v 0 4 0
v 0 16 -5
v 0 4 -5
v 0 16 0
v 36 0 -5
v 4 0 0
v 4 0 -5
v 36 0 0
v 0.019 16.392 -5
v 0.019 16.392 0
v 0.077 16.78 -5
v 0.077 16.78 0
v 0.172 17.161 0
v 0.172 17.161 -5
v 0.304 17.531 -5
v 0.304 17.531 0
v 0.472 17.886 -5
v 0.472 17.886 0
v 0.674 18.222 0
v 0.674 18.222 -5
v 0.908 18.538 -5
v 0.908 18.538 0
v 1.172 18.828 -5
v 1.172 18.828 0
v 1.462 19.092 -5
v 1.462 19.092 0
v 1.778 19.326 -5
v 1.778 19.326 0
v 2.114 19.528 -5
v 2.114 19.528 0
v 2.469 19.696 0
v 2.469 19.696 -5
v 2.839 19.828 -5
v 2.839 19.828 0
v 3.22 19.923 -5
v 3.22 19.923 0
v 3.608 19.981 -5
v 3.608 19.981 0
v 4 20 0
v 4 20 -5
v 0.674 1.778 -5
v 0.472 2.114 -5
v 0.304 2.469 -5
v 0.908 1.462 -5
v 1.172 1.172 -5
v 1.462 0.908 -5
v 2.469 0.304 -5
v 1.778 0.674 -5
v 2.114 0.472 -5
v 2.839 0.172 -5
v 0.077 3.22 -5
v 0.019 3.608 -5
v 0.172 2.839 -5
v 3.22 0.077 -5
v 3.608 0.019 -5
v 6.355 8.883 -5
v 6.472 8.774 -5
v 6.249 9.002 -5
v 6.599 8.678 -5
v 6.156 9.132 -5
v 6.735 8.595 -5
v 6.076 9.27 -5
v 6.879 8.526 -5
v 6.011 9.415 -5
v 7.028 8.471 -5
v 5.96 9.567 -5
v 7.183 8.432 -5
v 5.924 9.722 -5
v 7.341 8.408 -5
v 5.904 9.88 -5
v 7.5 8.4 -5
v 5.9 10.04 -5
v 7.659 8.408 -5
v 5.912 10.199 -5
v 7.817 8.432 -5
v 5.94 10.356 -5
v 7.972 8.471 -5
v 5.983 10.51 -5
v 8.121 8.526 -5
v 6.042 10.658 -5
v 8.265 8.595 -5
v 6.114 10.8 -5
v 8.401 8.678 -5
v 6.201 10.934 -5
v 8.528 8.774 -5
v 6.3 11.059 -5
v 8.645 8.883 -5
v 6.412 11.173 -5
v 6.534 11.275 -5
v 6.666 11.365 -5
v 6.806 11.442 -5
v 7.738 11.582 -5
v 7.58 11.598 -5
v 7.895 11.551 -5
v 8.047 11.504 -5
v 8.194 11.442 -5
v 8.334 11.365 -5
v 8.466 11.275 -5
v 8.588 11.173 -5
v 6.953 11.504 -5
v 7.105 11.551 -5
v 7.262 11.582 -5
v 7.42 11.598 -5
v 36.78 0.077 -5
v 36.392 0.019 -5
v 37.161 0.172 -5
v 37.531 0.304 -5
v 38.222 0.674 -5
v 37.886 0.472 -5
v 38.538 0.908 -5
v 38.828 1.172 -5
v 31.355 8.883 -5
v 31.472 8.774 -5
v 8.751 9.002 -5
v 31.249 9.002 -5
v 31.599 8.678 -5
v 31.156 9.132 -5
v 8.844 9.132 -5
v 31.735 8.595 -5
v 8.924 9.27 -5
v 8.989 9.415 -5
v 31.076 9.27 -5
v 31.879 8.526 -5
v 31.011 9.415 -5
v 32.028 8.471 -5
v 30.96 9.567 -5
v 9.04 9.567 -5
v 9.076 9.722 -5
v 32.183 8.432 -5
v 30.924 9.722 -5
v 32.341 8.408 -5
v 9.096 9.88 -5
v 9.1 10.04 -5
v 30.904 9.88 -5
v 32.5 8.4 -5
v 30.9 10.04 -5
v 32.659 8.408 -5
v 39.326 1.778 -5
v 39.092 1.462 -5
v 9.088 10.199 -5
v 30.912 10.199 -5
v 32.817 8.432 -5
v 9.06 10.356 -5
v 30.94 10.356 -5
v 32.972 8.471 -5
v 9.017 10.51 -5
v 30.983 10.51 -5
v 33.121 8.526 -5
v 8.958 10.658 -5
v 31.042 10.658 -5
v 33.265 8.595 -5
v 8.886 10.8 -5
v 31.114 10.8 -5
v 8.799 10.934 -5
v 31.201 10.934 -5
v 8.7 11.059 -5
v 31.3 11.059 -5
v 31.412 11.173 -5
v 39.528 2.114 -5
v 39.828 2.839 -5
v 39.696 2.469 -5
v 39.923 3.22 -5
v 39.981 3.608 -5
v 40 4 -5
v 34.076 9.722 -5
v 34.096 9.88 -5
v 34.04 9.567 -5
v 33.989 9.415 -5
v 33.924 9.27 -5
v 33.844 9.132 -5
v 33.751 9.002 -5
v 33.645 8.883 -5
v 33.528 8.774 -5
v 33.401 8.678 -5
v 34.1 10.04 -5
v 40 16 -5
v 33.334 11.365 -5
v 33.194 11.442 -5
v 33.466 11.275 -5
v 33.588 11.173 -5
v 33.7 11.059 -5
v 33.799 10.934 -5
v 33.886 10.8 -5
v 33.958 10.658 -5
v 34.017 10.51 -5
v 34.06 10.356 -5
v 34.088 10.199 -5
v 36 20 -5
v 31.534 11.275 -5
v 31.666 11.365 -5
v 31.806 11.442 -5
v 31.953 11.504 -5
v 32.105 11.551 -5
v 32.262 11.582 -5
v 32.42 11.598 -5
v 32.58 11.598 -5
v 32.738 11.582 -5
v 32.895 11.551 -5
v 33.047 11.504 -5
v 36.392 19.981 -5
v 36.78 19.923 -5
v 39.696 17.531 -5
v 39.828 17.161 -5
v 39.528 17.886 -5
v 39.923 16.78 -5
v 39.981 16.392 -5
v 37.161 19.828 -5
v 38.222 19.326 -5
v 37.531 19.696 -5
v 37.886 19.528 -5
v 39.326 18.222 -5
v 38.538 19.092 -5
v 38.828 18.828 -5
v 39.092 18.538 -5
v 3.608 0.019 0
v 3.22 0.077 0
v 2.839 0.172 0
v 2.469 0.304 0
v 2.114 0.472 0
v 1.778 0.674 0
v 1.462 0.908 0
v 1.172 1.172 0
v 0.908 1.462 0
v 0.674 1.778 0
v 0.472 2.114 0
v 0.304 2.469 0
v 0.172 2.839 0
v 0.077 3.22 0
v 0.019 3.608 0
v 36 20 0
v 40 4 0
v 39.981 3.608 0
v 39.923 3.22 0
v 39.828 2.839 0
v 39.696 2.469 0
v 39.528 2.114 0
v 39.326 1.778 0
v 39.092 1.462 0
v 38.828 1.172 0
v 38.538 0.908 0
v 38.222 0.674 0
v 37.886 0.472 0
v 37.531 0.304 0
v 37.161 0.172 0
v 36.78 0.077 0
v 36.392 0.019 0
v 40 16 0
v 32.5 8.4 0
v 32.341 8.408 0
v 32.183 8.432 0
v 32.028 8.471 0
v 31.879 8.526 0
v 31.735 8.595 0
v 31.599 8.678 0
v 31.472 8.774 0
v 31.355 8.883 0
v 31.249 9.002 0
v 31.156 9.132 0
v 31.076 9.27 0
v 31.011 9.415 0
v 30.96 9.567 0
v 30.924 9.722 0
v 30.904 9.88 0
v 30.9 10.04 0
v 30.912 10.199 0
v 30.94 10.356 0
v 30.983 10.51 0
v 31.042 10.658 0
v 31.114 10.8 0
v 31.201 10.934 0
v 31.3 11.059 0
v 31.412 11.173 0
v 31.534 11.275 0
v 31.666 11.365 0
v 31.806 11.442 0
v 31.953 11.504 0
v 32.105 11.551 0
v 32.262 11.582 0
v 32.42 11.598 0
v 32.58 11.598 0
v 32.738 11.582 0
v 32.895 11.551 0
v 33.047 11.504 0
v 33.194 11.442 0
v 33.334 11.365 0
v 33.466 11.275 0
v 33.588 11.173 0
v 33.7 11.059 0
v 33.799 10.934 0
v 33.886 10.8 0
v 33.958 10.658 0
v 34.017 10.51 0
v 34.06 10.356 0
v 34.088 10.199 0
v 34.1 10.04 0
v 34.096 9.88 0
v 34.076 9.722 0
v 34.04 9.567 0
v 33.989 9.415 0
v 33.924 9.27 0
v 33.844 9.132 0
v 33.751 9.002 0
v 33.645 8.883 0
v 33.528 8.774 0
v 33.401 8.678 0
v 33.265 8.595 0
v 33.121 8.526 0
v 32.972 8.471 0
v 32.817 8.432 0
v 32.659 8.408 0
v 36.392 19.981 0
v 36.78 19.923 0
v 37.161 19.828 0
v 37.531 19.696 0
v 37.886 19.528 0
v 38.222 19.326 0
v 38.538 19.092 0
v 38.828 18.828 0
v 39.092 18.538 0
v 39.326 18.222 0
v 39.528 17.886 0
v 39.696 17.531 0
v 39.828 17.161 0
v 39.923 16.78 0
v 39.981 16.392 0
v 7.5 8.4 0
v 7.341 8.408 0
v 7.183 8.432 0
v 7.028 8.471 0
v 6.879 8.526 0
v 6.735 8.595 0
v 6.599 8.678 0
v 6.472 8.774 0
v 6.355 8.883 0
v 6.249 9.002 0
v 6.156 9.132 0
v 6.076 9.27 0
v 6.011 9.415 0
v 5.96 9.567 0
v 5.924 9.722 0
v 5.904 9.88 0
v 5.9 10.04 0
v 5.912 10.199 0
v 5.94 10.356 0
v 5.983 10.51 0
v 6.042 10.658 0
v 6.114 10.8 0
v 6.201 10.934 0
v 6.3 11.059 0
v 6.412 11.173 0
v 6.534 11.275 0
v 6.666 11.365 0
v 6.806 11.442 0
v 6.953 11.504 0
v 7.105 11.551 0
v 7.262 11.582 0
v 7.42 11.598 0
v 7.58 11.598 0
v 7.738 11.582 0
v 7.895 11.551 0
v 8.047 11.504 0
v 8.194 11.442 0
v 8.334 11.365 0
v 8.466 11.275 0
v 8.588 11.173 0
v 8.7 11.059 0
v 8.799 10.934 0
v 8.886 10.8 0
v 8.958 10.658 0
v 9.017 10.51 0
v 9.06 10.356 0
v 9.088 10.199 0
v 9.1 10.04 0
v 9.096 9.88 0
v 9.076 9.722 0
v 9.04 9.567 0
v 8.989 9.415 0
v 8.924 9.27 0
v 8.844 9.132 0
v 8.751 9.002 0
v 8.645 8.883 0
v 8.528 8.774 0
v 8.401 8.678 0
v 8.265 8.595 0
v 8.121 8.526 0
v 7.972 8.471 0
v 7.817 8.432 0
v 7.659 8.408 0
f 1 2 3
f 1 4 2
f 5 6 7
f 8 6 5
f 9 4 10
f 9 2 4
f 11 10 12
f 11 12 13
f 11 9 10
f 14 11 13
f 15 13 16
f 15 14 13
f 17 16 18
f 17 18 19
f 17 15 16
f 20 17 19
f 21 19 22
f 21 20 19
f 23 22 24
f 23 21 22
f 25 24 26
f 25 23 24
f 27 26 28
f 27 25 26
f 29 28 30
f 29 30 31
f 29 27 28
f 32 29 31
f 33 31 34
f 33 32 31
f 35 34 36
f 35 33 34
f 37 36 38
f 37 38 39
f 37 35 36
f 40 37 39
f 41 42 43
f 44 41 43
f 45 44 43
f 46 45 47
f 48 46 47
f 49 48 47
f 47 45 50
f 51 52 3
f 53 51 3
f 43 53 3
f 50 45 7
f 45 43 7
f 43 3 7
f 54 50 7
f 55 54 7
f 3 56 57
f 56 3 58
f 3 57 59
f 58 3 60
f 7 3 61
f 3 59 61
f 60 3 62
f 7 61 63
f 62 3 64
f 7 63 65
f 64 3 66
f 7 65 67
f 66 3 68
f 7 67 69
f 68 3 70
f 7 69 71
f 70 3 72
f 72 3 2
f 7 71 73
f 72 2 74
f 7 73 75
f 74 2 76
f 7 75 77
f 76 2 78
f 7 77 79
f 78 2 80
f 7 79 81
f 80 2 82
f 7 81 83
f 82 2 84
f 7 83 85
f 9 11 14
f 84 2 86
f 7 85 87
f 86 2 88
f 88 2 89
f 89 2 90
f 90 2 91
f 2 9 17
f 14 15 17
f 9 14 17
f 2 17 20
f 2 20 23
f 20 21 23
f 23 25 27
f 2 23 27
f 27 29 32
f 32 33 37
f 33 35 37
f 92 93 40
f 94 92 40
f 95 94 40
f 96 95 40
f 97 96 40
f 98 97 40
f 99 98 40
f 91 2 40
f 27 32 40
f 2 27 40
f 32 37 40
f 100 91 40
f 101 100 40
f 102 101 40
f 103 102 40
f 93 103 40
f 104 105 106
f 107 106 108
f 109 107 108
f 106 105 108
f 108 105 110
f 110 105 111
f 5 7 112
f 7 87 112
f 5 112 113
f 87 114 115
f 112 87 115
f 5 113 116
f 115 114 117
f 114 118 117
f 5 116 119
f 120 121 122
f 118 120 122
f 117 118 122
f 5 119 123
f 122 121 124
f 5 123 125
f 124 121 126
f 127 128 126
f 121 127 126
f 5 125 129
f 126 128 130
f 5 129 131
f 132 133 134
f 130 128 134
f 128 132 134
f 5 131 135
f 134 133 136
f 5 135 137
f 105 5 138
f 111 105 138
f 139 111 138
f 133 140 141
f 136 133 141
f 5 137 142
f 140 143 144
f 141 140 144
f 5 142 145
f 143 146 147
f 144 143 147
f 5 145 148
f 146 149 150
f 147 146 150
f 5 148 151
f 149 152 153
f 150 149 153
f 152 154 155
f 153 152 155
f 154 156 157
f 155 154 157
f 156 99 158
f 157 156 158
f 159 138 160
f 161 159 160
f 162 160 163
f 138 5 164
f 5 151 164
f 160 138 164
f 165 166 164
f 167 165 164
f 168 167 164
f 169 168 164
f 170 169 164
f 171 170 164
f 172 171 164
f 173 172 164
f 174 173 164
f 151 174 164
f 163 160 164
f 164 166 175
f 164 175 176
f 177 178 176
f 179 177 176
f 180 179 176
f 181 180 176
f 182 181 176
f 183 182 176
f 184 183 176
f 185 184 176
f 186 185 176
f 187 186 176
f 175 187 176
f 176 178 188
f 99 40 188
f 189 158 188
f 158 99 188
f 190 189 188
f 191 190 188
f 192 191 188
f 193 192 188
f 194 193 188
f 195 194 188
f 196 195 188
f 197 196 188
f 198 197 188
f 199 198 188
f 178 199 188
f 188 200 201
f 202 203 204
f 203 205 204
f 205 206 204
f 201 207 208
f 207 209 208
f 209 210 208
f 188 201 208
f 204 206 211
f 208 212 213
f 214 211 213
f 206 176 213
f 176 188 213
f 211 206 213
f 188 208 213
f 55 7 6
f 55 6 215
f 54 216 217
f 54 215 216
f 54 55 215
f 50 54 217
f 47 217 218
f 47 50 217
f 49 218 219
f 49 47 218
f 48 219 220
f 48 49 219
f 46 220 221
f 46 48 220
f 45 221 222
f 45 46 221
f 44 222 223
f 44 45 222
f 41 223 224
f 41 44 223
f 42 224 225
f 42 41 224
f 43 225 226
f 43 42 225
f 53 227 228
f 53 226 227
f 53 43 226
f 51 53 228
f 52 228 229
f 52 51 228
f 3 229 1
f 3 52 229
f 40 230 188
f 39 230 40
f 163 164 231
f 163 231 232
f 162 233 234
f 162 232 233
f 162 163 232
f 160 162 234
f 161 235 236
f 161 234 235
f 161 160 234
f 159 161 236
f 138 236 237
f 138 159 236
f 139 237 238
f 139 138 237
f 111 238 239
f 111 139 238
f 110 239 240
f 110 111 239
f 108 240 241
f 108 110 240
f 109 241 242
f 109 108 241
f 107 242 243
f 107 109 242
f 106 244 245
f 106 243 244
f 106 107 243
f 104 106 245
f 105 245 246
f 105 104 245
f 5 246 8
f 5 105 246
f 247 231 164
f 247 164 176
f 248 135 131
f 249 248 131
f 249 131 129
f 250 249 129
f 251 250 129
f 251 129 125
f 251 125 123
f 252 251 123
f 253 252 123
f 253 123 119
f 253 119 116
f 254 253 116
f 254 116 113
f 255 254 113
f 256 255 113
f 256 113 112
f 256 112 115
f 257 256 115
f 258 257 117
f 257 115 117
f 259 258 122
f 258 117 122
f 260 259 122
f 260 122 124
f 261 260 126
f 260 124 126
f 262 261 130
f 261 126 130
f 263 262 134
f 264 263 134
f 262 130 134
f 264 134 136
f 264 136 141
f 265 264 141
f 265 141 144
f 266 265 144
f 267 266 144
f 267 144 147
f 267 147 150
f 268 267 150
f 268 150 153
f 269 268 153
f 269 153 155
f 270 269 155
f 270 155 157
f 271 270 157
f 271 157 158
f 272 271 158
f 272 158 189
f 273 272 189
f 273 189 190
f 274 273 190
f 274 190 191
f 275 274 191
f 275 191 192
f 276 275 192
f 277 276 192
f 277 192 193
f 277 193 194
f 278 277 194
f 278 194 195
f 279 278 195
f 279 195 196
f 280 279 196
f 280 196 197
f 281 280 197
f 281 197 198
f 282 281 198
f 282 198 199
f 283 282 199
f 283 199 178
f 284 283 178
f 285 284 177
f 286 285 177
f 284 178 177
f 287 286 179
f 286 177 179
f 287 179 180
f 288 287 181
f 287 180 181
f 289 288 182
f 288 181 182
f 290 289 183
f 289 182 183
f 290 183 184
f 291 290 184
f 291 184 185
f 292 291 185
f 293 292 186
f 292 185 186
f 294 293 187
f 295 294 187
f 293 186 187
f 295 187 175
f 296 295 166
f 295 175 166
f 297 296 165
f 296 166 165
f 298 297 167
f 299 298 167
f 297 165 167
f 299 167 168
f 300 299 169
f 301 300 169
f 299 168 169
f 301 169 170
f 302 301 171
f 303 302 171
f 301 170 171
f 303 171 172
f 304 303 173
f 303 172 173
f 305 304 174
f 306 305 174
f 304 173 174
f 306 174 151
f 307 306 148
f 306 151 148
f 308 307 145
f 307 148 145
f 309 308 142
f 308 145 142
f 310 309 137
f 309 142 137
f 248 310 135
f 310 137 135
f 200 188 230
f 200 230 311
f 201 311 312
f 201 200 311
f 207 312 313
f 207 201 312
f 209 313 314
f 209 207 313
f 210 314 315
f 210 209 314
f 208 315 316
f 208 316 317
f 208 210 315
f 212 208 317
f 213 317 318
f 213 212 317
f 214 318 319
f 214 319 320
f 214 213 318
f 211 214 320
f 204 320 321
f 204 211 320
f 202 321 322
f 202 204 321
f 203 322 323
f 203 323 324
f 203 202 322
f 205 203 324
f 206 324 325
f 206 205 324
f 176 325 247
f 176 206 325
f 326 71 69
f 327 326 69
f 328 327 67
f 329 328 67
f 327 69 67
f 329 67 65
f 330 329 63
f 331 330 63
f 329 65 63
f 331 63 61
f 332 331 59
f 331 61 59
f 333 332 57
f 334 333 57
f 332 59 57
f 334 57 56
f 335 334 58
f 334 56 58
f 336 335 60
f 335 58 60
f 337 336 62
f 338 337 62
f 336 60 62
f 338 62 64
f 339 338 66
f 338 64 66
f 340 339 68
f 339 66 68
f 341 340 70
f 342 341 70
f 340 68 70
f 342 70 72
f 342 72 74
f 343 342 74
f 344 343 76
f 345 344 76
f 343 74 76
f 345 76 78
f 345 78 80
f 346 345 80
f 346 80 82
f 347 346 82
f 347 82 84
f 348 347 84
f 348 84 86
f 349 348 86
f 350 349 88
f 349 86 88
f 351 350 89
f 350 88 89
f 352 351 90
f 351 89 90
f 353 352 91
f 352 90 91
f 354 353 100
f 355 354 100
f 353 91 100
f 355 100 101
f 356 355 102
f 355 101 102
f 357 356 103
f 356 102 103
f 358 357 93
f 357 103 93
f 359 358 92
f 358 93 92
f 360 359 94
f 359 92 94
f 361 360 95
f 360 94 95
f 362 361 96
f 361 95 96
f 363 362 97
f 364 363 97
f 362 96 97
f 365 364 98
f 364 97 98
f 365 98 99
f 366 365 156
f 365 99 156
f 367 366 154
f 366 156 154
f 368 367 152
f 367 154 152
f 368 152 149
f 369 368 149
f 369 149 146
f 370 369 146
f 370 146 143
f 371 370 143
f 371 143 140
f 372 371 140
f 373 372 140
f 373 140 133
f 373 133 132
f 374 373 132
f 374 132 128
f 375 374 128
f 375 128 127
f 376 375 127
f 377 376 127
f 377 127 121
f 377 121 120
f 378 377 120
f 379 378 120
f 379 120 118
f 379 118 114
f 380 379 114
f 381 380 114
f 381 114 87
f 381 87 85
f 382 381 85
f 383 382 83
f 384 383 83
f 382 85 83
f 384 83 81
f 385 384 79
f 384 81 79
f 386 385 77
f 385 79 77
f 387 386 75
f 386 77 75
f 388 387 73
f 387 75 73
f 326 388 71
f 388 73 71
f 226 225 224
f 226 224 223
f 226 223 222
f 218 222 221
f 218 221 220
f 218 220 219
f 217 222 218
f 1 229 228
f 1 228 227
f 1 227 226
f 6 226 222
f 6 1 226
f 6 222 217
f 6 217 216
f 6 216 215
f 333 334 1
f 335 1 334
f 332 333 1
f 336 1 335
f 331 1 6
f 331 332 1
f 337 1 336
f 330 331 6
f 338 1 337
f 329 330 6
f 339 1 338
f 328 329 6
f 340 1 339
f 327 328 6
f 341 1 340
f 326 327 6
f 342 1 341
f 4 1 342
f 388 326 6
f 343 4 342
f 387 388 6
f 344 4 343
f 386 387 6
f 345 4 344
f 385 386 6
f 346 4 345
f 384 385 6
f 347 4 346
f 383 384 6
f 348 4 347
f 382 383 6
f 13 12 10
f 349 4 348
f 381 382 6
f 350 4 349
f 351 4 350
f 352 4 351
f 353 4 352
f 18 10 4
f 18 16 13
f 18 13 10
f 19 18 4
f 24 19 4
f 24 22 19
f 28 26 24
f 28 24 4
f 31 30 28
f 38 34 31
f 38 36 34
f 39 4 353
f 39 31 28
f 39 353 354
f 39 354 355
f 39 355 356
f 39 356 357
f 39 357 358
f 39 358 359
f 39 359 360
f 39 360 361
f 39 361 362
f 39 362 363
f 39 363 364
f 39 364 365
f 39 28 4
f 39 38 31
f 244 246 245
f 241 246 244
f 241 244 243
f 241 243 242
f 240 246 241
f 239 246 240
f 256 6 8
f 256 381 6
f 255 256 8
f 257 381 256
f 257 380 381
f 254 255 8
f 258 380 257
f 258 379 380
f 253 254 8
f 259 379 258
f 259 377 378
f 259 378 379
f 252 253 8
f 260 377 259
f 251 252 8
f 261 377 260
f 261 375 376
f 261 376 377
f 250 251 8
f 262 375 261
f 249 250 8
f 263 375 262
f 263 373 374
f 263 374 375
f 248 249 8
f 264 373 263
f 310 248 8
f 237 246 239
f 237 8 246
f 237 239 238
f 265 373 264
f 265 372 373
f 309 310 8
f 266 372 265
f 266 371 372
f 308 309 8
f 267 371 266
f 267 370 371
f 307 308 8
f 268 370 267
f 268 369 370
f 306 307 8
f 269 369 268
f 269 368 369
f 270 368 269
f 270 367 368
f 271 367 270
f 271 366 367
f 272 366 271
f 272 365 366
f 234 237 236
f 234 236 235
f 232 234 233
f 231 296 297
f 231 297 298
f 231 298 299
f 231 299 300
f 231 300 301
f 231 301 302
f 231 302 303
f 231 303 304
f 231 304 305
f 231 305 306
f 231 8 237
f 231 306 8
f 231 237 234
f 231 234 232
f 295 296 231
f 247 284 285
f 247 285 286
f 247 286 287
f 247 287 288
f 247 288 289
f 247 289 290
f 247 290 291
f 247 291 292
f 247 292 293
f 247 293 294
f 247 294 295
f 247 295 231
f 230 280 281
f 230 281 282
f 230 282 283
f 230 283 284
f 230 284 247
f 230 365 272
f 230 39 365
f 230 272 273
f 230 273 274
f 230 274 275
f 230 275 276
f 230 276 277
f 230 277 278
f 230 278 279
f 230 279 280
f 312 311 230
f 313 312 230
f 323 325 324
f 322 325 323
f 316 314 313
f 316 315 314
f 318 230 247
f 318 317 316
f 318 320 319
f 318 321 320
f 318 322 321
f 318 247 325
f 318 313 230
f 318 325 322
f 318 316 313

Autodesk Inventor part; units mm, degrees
ref_plane "YZ Plane" through (0, 0, 0) normal (1, 0, 0) x (0, 1, 0)
ref_plane "XZ Plane" through (0, 0, 0) normal (0, 1, 0) x (-1, 0, 0)
ref_plane "XY Plane" through (0, 0, 0) normal (0, 0, 1) x (1, 0, 0)
sketch "Sketch1" plane through (0, 0, 0) normal (0, 0, 1) x (1, 0, 0)
  line L0 (0, 0) -> (40, 0)
  line L1 (40, 0) -> (40, 20)
  line L2 (40, 20) -> (0, 20)
  line L3 (0, 20) -> (0, 0)
  point P0 (7.5, 10)
  point P1 (32.5, 10)
  point P2 (40, 10)
  dimension "d0" = 20
  dimension "d1" = 7.5
  dimension "d2" = 7.5
  dimension "d3" = 25
extrude "Extrusion1" add sketch "Sketch1" against normal blind 5
hole "Hole1" at (7.5, 10, 0) at (32.5, 10, 0) direction (0, 0, -1) diameter 3.2 depth 25.4 tip angle 118
fillet "Fillet1" radius 4 4 edges at (40, 20, -2.5) (40, 0, -2.5) (0, 0, -2.5) (0, 20, -2.5)
properties part number "Spacer"
